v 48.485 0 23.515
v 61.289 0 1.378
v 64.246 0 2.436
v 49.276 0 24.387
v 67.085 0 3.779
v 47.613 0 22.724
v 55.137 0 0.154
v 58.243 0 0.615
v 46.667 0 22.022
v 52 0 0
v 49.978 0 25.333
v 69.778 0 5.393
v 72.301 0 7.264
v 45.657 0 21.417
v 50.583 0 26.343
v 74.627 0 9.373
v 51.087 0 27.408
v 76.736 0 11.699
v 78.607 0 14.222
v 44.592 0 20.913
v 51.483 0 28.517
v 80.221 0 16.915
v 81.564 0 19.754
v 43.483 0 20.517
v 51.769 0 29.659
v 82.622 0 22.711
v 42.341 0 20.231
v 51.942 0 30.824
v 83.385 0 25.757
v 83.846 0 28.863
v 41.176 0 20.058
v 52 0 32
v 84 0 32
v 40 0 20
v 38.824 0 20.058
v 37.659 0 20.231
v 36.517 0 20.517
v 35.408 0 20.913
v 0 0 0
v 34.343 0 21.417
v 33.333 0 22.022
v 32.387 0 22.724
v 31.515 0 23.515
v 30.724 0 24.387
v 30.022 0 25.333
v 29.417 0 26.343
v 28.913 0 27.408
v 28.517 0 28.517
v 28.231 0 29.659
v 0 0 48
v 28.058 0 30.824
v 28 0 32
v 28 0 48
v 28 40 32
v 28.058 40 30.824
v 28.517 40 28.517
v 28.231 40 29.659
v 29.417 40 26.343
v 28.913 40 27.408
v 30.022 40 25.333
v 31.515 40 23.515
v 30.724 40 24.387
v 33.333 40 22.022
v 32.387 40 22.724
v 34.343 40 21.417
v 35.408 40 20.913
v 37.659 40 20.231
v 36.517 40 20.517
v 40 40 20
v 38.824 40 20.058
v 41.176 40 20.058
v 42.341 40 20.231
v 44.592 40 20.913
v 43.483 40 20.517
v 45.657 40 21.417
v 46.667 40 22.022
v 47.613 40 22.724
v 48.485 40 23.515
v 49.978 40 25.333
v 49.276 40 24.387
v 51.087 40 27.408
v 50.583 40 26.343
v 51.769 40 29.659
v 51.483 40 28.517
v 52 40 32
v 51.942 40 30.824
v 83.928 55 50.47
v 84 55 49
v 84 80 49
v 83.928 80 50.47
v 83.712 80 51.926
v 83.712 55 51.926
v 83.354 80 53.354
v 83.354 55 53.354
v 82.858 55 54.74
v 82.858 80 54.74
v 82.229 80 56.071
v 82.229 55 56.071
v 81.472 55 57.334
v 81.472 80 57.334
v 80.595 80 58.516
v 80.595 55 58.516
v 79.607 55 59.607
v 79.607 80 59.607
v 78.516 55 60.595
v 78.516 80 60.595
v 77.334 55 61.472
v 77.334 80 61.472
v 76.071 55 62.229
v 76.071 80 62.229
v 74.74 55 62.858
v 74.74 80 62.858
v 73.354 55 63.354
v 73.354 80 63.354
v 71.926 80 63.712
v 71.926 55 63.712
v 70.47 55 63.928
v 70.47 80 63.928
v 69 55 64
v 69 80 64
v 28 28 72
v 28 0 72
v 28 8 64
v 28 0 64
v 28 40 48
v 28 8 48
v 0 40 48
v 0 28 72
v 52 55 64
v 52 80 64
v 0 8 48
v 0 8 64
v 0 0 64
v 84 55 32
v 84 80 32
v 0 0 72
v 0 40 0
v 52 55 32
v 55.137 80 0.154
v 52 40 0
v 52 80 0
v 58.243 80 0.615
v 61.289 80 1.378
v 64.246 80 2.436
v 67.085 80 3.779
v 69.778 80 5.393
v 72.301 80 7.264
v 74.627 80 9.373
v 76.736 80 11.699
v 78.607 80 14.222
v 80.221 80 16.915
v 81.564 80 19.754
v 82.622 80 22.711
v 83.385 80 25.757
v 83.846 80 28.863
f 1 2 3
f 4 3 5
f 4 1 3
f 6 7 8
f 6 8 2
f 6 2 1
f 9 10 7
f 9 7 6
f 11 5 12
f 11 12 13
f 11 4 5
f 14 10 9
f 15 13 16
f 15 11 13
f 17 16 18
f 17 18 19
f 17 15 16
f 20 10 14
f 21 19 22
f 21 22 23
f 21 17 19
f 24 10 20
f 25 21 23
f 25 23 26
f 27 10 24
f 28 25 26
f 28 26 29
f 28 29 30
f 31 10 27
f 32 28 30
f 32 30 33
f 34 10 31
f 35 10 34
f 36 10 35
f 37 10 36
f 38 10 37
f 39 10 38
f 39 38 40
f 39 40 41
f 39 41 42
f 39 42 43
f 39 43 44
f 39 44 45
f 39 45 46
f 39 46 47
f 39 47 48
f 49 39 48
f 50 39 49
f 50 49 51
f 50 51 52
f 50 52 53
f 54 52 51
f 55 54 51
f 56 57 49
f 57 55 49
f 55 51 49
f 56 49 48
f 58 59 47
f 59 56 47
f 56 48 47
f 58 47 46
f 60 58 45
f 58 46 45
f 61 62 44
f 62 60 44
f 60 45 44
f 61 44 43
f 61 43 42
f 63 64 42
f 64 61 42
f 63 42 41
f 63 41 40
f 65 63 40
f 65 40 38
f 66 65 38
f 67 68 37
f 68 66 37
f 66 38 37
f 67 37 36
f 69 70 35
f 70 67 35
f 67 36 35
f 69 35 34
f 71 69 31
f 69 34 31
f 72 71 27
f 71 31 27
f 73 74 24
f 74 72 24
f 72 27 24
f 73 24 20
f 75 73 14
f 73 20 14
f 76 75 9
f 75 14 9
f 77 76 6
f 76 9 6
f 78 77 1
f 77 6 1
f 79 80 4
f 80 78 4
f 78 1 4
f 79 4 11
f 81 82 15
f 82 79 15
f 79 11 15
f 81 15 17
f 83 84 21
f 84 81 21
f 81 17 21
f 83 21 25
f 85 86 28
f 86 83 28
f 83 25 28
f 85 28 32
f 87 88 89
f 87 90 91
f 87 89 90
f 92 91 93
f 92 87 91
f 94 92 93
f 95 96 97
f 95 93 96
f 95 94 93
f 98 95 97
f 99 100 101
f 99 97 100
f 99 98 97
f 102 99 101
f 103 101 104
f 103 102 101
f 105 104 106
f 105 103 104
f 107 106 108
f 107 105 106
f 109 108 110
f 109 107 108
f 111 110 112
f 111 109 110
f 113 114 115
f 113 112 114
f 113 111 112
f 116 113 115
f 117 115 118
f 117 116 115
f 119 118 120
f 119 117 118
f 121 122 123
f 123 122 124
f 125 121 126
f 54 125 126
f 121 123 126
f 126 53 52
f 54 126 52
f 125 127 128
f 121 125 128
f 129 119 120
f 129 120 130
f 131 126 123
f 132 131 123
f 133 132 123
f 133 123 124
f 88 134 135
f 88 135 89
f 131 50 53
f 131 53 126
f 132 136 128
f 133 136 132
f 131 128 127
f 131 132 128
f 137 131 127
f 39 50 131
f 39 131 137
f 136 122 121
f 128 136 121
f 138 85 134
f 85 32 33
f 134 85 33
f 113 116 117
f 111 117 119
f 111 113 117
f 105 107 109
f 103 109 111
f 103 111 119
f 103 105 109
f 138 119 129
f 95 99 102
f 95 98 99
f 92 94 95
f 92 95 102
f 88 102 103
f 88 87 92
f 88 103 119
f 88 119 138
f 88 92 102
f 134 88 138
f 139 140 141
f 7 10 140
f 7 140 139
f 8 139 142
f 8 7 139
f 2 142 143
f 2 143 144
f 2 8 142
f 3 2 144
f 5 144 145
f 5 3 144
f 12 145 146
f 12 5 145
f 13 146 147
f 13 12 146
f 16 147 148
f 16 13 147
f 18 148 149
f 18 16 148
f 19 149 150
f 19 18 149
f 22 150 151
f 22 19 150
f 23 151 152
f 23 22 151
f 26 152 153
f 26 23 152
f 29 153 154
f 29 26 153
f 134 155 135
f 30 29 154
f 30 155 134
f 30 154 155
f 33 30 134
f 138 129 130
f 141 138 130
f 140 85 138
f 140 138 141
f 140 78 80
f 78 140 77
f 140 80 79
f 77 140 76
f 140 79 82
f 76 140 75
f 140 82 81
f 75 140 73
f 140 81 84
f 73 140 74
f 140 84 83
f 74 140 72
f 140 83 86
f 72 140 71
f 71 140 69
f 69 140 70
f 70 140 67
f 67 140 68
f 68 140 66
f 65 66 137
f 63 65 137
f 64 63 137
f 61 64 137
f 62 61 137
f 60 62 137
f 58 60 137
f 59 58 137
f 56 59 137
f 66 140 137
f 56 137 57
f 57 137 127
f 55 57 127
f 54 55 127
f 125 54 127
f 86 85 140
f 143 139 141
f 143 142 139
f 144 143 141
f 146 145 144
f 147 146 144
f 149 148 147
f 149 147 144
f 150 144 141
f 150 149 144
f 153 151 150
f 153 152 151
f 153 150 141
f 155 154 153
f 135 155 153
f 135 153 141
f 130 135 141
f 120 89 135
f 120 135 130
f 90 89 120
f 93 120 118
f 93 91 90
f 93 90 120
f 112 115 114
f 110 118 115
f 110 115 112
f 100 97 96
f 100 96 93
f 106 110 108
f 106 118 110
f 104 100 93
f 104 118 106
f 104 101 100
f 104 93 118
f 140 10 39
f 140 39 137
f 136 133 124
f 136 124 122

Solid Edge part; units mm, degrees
sketch "Sketch1" plane through (0, 0, 0) normal (1, 0, 0) x (0, 1, 0)
  line L0 (8, 64) -> (0, 64)
  line L1 (0, 64) -> (0, 72)
  line L2 (0, 72) -> (28, 72)
  line L3 (40, 48) -> (28, 72)
  line L4 (40, 0) -> (40, 48)
  line L5 (0, 0) -> (40, 0)
  line L6 (0, 0) -> (0, 48)
  line L7 (0, 48) -> (8, 48)
  line L8 (8, 48) -> (8, 64)
extrude "Protrusion1" add sketch "Sketch1" along normal blind 28
sketch "Sketch2" plane through (14, 0, 24) normal (0, -1, 0) x (1, 0, 0)
  line L0 (14, -24) -> (14, 8)
  line L1 (14, -24) -> (38, -24)
  line L2 (38, 8) -> (38, -24)
  arc A0 (38, 8) -> (14, 8) centre (26, 8) cw
extrude "ExtrudedProtrusion_3" add sketch "Sketch2" against normal blind 40
sketch "Sketch3" plane through (14, 0, 24) normal (0, -1, 0) x (1, 0, 0)
  line L0 (38, 8) -> (70, 8)
  arc A0 (38, -24) -> (70, 8) centre (38, 8) ccw
  line L1 (38, 8) -> (38, -24)
extrude "ExtrudedProtrusion_4" add sketch "Sketch3" against normal blind 80
sketch "Sketch4" plane through (42, 55, 24) normal (0, -1, 0) x (1, 0, 0)
  line L0 (27, 40) -> (10, 40)
  line L1 (10, 8) -> (10, 40)
  line L2 (10, 8) -> (42, 8)
  line L3 (42, 8) -> (42, 25)
  arc A0 (27, 40) -> (42, 25) centre (27, 25) cw
extrude "ExtrudedProtrusion_5" add sketch "Sketch4" against normal blind 25
